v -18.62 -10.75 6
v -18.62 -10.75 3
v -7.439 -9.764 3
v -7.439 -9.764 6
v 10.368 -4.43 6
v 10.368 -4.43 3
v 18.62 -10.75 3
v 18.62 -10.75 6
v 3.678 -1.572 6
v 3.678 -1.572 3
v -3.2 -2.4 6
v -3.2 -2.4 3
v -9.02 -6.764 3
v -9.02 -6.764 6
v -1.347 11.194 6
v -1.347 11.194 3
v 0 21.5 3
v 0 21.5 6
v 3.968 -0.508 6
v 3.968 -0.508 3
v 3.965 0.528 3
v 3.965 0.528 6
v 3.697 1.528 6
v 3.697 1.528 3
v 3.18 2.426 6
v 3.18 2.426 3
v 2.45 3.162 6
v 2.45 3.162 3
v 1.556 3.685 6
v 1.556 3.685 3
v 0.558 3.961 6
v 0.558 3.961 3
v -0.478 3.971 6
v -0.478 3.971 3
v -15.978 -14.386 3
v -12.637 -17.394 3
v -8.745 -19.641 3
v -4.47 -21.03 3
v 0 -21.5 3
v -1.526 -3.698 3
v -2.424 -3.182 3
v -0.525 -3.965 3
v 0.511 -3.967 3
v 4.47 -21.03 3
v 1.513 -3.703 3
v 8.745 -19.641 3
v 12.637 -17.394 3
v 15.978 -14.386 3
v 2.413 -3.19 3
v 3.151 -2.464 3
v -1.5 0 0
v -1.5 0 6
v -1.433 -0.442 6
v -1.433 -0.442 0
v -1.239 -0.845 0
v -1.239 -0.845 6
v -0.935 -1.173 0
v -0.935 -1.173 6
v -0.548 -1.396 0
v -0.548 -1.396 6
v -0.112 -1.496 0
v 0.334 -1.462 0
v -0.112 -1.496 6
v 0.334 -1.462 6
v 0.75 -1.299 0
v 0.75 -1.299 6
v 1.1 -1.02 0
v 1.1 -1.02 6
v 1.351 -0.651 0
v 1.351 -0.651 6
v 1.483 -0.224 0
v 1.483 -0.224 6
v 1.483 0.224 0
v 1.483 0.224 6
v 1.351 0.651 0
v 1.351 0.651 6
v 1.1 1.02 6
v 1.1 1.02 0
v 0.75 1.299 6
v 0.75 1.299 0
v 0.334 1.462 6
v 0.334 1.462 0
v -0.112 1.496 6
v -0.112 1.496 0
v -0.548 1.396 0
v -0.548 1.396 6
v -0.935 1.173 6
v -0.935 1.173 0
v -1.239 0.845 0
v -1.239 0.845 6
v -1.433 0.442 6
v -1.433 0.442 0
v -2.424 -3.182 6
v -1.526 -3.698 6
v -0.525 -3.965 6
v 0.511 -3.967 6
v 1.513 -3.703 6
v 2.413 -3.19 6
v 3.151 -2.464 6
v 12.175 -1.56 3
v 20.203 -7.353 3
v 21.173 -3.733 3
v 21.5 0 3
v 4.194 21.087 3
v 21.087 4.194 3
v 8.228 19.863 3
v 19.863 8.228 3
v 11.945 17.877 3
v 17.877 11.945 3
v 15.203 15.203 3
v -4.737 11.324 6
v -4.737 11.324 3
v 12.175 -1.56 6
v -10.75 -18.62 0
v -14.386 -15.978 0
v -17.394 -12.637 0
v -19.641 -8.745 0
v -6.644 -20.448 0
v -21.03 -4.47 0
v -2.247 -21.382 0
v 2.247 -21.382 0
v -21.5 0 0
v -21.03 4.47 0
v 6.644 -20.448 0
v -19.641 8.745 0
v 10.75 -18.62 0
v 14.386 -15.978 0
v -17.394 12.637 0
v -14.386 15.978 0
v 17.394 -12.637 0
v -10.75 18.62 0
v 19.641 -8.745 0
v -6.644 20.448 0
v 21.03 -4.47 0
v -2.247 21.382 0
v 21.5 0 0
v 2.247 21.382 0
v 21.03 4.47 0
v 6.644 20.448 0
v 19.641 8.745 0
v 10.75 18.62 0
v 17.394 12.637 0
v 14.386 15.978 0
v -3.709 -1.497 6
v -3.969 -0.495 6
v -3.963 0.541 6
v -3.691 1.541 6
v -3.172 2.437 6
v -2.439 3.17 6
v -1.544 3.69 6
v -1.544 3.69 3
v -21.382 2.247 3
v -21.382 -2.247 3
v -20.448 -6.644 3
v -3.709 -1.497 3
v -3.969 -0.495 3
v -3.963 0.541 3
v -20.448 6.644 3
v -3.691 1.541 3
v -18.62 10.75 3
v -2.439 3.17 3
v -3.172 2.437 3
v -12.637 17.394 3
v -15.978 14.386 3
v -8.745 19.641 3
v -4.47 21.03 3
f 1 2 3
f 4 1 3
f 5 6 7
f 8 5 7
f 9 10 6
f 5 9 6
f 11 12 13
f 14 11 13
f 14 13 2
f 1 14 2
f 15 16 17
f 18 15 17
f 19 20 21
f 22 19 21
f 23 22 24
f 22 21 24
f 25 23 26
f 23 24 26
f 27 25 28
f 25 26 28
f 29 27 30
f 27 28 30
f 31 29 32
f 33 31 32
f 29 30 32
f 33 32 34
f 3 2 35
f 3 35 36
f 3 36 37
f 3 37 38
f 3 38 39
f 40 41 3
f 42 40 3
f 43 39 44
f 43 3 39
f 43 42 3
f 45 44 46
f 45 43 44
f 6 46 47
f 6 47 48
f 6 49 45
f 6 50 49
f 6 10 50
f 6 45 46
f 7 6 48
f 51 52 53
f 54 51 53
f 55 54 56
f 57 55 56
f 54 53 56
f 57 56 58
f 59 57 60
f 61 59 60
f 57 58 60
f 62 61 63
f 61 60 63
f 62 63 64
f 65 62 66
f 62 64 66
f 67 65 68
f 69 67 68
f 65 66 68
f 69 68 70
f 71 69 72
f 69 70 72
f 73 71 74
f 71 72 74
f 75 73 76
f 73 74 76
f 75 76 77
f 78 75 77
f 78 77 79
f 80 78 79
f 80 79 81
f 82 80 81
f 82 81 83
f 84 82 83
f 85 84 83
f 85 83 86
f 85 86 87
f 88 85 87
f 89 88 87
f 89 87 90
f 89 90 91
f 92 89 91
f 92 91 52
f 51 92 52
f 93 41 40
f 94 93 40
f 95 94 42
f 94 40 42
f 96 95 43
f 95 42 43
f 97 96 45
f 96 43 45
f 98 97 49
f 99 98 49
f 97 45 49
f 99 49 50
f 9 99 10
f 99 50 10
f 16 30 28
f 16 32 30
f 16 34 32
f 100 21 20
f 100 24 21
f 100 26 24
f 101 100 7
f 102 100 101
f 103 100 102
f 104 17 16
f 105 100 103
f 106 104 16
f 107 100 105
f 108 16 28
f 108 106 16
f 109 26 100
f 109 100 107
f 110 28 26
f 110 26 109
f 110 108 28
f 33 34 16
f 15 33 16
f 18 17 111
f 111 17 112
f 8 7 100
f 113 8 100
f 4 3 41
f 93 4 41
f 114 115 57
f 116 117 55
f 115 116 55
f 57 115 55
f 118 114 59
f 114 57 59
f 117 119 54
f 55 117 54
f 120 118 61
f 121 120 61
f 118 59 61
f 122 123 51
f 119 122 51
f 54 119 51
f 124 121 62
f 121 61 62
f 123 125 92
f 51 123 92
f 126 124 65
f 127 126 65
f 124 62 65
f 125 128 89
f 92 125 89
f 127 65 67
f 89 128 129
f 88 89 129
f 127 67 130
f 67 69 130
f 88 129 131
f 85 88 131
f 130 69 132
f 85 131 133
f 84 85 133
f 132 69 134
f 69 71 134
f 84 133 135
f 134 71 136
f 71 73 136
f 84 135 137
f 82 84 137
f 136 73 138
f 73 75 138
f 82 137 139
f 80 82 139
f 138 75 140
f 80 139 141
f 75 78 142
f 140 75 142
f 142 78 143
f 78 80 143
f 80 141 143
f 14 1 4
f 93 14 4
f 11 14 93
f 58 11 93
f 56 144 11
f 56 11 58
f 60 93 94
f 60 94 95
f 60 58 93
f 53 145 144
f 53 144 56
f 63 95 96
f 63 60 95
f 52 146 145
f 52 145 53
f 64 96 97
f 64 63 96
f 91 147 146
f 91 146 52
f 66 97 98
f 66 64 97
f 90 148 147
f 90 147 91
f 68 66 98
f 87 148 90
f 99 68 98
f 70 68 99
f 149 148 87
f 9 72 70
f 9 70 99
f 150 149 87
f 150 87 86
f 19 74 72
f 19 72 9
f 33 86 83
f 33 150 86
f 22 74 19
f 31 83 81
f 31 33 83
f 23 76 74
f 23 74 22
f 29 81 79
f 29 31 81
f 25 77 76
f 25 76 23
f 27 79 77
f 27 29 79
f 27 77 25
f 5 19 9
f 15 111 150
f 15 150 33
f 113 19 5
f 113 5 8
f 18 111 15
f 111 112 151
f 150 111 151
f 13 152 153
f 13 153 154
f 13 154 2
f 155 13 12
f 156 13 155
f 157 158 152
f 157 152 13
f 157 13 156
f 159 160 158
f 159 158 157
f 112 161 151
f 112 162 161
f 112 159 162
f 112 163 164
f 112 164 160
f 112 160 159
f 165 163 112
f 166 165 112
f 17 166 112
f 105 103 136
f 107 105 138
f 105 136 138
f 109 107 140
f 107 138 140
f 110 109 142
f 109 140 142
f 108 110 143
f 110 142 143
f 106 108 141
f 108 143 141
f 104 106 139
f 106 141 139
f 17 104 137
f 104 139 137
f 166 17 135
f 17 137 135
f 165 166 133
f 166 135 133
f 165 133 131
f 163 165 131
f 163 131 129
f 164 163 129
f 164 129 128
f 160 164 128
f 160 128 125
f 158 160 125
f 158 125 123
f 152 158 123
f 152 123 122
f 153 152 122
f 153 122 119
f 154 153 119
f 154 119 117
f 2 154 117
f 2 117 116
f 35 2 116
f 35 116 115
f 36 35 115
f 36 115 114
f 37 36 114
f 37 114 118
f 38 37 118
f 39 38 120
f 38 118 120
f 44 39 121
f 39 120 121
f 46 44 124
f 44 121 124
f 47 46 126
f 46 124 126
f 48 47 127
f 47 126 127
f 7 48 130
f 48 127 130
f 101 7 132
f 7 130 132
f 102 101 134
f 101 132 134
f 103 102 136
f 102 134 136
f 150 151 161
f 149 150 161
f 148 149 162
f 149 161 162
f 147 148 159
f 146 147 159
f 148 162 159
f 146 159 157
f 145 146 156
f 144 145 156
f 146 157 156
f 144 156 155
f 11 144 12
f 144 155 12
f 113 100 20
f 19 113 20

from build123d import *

# Parameters (mm, degrees)
F0_R     = 21.5
F1_DEPTH = 3
F2_R     = 1
F3_DEPTH = 3
F4_D     = 3


with BuildPart() as f1:
    # F0 (on Top) → F1 (new body)
    with BuildSketch(Plane.XY):
        Circle(F0_R)
    extrude(amount=F1_DEPTH)

    # F2 (on face) → F3 (join)
    with BuildSketch(Plane.XY.offset(3)):
        with BuildLine():
            Line((-1.347391, 11.193886), (0, 21.5))
            Line((0, 21.5), (-4.736634, 11.324242))
            Line((-4.736634, 11.324242), (-1.543514, 3.690199))
            ThreePointArc((-1.543514, 3.690199), (-3.859717, 1.050041), (-3.200264, -2.399647))
            Line((-3.200264, -2.399647), (-9.020494, -6.763818))
            Line((-9.020494, -6.763818), (-18.619546, -10.75))
            Line((-18.619546, -10.75), (-7.438764, -9.764166))
            Line((-7.438764, -9.764166), (-2.424049, -3.181821))
            ThreePointArc((-2.424049, -3.181821), (1.020496, -3.867633), (3.678288, -1.571687))
            Line((3.678288, -1.571687), (10.367886, -4.430068))
            Line((10.367886, -4.430068), (18.619546, -10.75))
            Line((18.619546, -10.75), (12.175398, -1.560076))
            Line((12.175398, -1.560076), (3.967563, -0.508377))
            ThreePointArc((3.967563, -0.508377), (2.839221, 2.817592), (-0.478023, 3.971334))
            Line((-0.478023, 3.971334), (-1.347391, 11.193886))
        make_face()
        Circle(F2_R, mode=Mode.SUBTRACT)
    extrude(amount=F3_DEPTH)

    # F4 (through all)
    with Locations(Plane(origin=(0, 0, 0), x_dir=(1, 0, 0), z_dir=(0, 0, -1))):
        with Locations((0, 0)):
            Hole(F4_D / 2)


solid = f1.part
